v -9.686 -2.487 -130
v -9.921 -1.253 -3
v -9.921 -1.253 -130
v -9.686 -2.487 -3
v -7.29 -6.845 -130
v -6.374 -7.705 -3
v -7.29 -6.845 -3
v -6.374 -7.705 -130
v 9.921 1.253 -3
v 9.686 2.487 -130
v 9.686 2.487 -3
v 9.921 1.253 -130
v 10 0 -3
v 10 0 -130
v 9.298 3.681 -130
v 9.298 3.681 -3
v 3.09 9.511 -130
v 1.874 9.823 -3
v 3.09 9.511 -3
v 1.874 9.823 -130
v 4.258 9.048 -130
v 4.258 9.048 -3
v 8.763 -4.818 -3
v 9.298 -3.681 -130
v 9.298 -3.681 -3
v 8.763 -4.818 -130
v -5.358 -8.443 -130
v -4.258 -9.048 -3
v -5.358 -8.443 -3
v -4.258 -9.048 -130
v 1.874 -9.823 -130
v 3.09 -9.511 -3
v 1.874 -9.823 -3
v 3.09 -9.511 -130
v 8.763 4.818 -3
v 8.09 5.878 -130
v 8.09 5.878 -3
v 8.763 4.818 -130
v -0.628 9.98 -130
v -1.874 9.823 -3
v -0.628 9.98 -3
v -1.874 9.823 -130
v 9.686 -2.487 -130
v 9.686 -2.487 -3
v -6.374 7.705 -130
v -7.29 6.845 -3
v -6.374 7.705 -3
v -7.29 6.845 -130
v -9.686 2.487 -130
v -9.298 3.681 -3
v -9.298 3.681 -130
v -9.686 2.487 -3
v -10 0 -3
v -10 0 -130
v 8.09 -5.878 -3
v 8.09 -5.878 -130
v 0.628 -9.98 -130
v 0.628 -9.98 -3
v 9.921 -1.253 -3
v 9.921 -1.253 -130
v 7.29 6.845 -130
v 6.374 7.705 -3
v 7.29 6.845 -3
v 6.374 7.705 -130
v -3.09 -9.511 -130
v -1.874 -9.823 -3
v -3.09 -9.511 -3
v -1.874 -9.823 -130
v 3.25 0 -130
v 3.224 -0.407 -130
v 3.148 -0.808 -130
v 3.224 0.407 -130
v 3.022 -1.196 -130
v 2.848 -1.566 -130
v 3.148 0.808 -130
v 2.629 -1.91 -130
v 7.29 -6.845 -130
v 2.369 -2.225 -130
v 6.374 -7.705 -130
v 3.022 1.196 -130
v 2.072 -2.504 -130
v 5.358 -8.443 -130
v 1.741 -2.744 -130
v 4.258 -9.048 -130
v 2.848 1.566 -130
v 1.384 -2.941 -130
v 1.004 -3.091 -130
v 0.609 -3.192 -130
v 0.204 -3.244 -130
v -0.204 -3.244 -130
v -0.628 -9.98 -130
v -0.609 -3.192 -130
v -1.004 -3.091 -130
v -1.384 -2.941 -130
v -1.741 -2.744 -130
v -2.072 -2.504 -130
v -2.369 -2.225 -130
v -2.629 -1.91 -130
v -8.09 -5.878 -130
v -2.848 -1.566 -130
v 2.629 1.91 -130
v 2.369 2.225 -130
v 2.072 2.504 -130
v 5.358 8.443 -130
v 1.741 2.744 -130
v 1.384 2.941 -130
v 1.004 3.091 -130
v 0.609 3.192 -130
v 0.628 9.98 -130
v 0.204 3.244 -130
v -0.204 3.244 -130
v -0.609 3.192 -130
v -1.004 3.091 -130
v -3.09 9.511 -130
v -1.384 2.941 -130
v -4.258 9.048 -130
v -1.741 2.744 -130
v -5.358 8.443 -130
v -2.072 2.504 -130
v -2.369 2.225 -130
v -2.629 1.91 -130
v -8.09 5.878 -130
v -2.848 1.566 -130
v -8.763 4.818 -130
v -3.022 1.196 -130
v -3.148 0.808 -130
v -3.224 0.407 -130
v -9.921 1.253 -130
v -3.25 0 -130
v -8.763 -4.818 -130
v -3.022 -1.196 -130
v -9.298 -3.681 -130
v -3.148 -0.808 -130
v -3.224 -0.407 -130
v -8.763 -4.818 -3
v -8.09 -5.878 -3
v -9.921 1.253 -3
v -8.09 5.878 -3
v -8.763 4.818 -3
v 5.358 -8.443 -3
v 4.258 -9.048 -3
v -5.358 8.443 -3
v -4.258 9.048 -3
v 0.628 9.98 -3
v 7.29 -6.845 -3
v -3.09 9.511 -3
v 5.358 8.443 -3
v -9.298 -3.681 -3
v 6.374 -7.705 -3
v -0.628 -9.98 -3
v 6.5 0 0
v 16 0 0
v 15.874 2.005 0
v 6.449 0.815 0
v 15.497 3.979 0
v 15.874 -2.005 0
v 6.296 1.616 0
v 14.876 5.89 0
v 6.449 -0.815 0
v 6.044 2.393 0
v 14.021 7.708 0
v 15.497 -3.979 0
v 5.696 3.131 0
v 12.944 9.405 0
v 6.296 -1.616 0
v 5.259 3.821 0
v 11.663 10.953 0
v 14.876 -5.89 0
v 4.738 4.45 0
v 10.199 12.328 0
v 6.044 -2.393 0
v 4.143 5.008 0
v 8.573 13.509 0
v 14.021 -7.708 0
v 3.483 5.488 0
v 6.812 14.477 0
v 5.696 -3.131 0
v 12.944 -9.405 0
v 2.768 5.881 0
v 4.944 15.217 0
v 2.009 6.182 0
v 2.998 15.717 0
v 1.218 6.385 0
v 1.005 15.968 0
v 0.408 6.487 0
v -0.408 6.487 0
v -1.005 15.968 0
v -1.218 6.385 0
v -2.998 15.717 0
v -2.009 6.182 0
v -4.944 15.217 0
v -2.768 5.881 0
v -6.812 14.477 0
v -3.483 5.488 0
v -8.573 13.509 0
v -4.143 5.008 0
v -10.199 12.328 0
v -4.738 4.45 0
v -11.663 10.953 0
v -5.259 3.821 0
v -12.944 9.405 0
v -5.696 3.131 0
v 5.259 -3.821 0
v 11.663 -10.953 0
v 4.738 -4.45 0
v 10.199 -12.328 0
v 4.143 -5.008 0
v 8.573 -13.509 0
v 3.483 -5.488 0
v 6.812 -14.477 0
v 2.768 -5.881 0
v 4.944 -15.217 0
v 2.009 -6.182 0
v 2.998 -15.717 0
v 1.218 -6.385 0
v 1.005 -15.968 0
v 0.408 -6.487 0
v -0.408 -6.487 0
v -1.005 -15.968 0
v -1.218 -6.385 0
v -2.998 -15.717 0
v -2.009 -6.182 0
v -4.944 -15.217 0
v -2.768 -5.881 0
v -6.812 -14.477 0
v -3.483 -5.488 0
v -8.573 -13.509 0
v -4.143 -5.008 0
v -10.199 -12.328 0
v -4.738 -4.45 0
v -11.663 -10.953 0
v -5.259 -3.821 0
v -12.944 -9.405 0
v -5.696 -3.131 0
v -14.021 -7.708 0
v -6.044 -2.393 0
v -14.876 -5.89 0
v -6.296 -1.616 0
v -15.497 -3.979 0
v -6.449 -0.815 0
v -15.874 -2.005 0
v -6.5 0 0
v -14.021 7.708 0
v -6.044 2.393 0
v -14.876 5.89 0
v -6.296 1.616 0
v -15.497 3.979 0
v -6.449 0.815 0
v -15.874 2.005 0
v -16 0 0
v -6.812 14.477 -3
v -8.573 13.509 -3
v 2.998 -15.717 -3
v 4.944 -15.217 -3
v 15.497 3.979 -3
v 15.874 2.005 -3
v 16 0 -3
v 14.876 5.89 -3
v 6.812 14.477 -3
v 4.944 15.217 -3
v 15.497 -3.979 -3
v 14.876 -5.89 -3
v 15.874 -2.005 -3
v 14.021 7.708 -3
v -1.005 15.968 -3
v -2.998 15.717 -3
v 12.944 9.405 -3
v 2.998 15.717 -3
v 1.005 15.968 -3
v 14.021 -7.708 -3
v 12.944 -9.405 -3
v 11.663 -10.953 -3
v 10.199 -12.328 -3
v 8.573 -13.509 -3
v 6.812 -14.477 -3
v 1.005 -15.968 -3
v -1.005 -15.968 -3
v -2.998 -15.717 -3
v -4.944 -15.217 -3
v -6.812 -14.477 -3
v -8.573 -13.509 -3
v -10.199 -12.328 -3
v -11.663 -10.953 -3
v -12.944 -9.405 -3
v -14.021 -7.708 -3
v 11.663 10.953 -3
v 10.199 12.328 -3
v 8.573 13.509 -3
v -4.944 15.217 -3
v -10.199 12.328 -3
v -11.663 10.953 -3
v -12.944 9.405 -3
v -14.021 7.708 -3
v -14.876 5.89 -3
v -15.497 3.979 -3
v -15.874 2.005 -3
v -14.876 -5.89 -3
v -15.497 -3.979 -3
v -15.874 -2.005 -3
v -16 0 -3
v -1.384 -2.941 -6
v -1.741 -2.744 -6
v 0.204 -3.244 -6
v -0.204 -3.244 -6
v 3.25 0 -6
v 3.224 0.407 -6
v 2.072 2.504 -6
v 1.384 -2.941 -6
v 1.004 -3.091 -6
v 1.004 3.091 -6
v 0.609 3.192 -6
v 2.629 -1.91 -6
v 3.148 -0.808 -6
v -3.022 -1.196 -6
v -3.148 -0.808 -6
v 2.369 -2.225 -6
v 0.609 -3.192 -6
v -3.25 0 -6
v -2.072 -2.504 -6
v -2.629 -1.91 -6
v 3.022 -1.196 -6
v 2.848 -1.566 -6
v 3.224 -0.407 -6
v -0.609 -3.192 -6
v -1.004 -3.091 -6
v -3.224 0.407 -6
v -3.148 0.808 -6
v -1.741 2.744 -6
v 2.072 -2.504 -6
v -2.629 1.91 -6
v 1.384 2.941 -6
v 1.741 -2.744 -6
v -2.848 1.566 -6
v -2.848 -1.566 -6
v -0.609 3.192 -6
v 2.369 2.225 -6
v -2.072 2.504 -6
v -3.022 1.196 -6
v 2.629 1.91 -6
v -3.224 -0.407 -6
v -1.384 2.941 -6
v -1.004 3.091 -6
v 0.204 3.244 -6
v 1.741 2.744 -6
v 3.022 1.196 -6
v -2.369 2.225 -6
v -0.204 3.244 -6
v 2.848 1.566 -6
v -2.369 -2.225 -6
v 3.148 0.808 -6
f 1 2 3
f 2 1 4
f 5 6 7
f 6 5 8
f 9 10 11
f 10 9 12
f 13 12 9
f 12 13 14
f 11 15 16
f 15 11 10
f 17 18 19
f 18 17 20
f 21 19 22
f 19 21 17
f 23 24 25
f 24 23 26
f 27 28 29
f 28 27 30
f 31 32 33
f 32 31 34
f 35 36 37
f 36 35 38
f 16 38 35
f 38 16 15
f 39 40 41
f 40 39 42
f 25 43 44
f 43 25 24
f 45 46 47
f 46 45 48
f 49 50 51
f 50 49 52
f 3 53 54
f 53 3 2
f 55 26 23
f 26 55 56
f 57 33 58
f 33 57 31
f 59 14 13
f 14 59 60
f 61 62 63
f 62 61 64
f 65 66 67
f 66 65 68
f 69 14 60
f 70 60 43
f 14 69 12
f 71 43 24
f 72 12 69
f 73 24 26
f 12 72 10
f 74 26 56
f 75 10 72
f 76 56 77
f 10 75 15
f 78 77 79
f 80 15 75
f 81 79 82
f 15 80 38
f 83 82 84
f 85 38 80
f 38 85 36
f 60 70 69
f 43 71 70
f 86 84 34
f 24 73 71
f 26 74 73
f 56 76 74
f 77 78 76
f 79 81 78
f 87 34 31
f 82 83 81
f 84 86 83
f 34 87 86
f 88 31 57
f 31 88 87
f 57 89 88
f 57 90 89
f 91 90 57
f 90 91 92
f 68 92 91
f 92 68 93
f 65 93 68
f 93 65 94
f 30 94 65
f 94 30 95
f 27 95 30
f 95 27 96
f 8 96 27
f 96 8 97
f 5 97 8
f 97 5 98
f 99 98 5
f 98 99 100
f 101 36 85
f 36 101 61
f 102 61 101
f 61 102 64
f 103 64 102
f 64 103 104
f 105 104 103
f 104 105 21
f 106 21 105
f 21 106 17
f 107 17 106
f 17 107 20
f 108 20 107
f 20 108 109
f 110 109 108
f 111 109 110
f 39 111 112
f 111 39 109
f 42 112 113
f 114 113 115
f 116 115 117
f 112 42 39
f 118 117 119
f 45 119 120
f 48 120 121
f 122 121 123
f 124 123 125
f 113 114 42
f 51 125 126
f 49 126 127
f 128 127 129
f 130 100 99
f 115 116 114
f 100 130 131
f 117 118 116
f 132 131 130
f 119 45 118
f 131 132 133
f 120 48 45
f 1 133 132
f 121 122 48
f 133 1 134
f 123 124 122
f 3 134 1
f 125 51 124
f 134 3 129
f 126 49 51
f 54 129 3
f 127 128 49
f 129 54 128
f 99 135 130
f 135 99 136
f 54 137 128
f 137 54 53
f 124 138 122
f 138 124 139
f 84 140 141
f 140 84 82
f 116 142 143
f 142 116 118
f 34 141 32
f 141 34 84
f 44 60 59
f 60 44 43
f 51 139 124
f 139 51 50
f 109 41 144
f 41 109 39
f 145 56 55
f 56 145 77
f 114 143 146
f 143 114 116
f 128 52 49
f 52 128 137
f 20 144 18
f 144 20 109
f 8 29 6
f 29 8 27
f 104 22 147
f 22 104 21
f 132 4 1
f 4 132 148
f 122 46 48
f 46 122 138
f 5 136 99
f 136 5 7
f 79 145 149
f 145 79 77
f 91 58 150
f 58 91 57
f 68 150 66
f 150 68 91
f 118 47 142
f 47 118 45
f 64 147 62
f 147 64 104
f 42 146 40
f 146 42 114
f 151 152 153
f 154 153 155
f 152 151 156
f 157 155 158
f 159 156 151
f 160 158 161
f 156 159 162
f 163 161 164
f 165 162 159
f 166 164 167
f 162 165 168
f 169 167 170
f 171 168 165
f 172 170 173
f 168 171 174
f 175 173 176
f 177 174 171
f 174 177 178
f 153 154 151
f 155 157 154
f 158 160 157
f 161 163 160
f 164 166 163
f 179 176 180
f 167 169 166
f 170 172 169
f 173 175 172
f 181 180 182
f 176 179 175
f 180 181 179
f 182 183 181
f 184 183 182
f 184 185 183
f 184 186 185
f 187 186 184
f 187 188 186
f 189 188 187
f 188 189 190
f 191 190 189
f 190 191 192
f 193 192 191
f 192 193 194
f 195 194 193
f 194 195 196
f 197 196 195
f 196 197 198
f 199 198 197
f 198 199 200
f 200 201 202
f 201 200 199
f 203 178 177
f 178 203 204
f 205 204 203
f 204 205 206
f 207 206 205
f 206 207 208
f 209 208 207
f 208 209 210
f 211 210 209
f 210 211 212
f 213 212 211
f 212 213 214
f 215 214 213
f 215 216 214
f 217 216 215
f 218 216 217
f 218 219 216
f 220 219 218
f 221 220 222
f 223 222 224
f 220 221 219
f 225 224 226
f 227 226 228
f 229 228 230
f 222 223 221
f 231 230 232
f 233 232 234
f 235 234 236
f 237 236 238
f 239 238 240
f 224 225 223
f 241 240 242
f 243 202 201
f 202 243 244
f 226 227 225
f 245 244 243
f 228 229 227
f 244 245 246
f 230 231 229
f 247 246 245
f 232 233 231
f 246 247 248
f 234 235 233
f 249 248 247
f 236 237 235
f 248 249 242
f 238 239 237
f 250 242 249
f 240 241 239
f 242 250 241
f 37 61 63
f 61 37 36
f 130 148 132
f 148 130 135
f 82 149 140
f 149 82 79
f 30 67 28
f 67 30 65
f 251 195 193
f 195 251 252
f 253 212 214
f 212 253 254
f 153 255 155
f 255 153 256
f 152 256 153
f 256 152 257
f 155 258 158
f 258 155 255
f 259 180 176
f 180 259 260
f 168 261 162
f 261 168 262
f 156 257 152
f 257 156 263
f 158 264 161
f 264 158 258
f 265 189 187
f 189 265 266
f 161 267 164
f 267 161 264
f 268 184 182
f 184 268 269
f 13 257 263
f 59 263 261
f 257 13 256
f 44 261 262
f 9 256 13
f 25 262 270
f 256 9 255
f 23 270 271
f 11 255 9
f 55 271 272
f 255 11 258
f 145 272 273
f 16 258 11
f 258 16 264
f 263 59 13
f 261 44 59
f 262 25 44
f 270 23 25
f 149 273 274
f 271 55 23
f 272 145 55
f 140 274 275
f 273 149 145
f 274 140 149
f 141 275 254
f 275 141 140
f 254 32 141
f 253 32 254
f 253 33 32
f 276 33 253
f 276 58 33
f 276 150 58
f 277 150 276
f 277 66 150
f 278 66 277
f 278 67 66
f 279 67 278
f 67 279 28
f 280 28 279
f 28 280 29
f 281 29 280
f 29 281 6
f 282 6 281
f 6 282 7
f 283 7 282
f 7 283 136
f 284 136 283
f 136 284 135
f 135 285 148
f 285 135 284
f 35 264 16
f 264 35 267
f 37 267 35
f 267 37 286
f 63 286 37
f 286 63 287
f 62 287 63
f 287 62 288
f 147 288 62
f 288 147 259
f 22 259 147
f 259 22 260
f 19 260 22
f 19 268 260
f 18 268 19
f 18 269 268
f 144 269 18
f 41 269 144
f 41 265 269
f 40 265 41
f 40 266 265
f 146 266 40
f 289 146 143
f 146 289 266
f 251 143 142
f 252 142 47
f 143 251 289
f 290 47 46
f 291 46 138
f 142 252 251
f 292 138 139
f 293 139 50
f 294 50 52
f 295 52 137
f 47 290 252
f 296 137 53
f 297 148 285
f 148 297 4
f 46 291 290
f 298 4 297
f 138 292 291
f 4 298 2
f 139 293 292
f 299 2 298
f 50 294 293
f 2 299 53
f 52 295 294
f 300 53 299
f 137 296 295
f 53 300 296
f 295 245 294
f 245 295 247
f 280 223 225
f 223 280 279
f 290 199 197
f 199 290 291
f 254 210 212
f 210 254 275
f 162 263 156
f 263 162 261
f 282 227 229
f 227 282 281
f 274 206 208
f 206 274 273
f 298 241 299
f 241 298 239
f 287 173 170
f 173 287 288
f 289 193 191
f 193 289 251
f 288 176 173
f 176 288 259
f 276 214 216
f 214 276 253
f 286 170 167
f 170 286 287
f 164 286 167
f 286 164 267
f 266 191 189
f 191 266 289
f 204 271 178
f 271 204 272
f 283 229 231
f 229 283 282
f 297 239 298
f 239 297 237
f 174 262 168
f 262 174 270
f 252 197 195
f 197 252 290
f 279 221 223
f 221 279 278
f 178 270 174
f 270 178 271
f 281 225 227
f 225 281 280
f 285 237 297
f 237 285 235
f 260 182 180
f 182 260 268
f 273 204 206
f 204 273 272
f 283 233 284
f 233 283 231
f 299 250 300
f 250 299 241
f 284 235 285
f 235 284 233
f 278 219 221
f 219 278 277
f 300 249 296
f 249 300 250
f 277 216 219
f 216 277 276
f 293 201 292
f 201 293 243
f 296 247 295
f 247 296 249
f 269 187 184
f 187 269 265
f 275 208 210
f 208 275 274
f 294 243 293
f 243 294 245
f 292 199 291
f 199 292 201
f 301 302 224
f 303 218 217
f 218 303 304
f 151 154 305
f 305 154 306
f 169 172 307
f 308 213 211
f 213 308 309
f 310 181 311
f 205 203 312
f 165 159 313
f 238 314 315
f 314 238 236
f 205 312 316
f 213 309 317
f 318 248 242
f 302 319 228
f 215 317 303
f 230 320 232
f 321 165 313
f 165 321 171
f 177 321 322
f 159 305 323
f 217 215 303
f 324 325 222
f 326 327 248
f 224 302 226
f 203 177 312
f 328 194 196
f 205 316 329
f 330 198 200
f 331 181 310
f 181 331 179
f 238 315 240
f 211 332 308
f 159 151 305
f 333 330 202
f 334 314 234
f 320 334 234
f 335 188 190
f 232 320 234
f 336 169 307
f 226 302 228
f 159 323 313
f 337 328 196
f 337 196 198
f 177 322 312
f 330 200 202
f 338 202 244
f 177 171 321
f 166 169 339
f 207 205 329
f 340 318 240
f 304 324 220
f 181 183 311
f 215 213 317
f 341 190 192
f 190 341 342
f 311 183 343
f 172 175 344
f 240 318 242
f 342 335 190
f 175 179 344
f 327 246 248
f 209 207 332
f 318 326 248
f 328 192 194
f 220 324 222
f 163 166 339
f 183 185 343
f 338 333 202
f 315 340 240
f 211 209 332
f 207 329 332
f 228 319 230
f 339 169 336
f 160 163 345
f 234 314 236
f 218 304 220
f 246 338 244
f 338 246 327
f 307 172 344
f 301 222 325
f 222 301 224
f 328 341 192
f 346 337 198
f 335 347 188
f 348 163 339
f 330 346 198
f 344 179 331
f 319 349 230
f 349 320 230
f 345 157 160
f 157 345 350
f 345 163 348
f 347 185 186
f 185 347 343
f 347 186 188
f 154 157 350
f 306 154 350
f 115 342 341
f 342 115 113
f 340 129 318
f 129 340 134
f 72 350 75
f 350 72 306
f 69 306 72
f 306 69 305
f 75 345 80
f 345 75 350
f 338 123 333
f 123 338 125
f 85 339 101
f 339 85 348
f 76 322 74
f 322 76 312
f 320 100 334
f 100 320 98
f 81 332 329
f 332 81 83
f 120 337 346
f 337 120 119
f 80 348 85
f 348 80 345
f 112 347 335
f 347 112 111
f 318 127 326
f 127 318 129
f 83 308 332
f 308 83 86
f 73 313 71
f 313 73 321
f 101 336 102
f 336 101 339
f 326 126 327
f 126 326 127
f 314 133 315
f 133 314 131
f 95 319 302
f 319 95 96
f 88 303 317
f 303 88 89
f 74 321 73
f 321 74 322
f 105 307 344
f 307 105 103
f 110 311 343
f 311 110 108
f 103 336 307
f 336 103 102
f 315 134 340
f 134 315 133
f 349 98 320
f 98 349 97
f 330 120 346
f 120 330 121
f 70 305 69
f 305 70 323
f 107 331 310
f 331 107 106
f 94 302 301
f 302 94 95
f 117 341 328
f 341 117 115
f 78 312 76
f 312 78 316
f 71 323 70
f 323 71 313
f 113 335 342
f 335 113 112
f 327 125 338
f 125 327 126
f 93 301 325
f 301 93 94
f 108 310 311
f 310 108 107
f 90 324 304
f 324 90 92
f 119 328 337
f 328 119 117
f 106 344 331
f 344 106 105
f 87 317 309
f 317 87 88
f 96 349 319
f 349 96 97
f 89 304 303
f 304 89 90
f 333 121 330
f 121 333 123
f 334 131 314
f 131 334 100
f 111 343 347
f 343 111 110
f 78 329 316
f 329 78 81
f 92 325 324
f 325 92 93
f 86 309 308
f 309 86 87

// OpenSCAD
$fn = 50;


difference() {
	union() {
		translate(v = [0, 0, -130.0000000000]) {
			cylinder(h = 130, r = 10.0000000000);
		}
		translate(v = [0, 0, -3.0000000000]) {
			cylinder(h = 3, r = 16.0000000000);
		}
	}
	union() {
		translate(v = [0, 0, 0]) {
			rotate(a = [0, 0, 0]) {
				difference() {
					union() {
						#translate(v = [0, 0, -130.0000000000]) {
							cylinder(h = 130, r = 2.2500000000);
						}
						#translate(v = [0, 0, -6]) {
							cylinder(h = 6, r = 10.0000000000, r1 = 3.2500000000, r2 = 6.5000000000);
						}
						#translate(v = [0, 0, -130.0000000000]) {
							cylinder(h = 130, r = 3.2500000000);
						}
						#translate(v = [0, 0, -130.0000000000]) {
							cylinder(h = 130, r = 2.2500000000);
						}
					}
					union();
				}
			}
		}
	}
}
